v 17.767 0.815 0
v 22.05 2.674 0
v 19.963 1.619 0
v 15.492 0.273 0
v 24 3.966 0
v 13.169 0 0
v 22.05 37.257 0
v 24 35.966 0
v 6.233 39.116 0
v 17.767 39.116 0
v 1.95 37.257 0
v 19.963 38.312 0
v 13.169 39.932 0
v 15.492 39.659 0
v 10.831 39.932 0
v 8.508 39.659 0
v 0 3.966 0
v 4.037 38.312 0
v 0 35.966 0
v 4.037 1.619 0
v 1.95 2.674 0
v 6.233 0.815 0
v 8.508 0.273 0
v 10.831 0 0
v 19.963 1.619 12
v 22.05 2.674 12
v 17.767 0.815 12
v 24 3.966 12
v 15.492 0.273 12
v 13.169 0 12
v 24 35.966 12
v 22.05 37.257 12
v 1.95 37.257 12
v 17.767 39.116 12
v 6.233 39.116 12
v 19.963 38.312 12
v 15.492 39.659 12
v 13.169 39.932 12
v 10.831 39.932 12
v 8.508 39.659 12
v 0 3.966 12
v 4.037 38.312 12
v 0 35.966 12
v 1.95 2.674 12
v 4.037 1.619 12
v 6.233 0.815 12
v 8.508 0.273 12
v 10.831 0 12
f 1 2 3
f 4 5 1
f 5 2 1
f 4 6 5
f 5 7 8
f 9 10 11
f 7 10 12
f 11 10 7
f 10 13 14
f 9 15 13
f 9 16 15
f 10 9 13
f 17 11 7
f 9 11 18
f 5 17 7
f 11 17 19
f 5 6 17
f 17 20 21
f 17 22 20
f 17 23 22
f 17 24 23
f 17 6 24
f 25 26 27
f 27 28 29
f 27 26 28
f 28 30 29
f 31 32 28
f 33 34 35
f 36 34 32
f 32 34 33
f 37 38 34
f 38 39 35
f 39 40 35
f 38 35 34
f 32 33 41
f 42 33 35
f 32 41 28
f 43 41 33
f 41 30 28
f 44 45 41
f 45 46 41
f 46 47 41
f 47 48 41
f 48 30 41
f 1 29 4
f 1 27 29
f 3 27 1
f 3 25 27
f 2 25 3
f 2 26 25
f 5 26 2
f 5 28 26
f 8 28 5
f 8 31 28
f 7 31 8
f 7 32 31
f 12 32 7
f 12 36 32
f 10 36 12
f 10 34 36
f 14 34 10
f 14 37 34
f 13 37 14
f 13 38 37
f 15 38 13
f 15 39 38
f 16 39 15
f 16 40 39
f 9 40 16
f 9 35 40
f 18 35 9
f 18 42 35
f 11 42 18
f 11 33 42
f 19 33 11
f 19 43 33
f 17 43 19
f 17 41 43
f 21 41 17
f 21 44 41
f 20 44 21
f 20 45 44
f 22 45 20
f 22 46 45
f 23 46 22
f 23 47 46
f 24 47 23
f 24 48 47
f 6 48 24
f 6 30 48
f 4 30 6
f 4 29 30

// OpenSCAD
$fn = 32;

// ----------------------------------------------------------------------
// Eccentric disc: double_d, 12 mm thick
// ----------------------------------------------------------------------

// --- parameters (mm) ---
profile_height = 12;      // extrusion height
profile_points = 24;      // points of the closed outline

profile = [[24, 35.966], [22.05, 37.257], [19.963, 38.312], [17.767, 39.116], [15.492, 39.659], [13.169, 39.932], [10.831, 39.932], [8.508, 39.659], [6.233, 39.116], [4.037, 38.312], [1.95, 37.257], [0, 35.966], [0, 3.966], [1.95, 2.674], [4.037, 1.619], [6.233, 0.815], [8.508, 0.273], [10.831, 0], [13.169, 0], [15.492, 0.273], [17.767, 0.815], [19.963, 1.619], [22.05, 2.674], [24, 3.966]];  // single closed polygon, 24 points, counter clockwise

// --- the one profile operation ---
linear_extrude(height = profile_height) polygon(points = profile);
